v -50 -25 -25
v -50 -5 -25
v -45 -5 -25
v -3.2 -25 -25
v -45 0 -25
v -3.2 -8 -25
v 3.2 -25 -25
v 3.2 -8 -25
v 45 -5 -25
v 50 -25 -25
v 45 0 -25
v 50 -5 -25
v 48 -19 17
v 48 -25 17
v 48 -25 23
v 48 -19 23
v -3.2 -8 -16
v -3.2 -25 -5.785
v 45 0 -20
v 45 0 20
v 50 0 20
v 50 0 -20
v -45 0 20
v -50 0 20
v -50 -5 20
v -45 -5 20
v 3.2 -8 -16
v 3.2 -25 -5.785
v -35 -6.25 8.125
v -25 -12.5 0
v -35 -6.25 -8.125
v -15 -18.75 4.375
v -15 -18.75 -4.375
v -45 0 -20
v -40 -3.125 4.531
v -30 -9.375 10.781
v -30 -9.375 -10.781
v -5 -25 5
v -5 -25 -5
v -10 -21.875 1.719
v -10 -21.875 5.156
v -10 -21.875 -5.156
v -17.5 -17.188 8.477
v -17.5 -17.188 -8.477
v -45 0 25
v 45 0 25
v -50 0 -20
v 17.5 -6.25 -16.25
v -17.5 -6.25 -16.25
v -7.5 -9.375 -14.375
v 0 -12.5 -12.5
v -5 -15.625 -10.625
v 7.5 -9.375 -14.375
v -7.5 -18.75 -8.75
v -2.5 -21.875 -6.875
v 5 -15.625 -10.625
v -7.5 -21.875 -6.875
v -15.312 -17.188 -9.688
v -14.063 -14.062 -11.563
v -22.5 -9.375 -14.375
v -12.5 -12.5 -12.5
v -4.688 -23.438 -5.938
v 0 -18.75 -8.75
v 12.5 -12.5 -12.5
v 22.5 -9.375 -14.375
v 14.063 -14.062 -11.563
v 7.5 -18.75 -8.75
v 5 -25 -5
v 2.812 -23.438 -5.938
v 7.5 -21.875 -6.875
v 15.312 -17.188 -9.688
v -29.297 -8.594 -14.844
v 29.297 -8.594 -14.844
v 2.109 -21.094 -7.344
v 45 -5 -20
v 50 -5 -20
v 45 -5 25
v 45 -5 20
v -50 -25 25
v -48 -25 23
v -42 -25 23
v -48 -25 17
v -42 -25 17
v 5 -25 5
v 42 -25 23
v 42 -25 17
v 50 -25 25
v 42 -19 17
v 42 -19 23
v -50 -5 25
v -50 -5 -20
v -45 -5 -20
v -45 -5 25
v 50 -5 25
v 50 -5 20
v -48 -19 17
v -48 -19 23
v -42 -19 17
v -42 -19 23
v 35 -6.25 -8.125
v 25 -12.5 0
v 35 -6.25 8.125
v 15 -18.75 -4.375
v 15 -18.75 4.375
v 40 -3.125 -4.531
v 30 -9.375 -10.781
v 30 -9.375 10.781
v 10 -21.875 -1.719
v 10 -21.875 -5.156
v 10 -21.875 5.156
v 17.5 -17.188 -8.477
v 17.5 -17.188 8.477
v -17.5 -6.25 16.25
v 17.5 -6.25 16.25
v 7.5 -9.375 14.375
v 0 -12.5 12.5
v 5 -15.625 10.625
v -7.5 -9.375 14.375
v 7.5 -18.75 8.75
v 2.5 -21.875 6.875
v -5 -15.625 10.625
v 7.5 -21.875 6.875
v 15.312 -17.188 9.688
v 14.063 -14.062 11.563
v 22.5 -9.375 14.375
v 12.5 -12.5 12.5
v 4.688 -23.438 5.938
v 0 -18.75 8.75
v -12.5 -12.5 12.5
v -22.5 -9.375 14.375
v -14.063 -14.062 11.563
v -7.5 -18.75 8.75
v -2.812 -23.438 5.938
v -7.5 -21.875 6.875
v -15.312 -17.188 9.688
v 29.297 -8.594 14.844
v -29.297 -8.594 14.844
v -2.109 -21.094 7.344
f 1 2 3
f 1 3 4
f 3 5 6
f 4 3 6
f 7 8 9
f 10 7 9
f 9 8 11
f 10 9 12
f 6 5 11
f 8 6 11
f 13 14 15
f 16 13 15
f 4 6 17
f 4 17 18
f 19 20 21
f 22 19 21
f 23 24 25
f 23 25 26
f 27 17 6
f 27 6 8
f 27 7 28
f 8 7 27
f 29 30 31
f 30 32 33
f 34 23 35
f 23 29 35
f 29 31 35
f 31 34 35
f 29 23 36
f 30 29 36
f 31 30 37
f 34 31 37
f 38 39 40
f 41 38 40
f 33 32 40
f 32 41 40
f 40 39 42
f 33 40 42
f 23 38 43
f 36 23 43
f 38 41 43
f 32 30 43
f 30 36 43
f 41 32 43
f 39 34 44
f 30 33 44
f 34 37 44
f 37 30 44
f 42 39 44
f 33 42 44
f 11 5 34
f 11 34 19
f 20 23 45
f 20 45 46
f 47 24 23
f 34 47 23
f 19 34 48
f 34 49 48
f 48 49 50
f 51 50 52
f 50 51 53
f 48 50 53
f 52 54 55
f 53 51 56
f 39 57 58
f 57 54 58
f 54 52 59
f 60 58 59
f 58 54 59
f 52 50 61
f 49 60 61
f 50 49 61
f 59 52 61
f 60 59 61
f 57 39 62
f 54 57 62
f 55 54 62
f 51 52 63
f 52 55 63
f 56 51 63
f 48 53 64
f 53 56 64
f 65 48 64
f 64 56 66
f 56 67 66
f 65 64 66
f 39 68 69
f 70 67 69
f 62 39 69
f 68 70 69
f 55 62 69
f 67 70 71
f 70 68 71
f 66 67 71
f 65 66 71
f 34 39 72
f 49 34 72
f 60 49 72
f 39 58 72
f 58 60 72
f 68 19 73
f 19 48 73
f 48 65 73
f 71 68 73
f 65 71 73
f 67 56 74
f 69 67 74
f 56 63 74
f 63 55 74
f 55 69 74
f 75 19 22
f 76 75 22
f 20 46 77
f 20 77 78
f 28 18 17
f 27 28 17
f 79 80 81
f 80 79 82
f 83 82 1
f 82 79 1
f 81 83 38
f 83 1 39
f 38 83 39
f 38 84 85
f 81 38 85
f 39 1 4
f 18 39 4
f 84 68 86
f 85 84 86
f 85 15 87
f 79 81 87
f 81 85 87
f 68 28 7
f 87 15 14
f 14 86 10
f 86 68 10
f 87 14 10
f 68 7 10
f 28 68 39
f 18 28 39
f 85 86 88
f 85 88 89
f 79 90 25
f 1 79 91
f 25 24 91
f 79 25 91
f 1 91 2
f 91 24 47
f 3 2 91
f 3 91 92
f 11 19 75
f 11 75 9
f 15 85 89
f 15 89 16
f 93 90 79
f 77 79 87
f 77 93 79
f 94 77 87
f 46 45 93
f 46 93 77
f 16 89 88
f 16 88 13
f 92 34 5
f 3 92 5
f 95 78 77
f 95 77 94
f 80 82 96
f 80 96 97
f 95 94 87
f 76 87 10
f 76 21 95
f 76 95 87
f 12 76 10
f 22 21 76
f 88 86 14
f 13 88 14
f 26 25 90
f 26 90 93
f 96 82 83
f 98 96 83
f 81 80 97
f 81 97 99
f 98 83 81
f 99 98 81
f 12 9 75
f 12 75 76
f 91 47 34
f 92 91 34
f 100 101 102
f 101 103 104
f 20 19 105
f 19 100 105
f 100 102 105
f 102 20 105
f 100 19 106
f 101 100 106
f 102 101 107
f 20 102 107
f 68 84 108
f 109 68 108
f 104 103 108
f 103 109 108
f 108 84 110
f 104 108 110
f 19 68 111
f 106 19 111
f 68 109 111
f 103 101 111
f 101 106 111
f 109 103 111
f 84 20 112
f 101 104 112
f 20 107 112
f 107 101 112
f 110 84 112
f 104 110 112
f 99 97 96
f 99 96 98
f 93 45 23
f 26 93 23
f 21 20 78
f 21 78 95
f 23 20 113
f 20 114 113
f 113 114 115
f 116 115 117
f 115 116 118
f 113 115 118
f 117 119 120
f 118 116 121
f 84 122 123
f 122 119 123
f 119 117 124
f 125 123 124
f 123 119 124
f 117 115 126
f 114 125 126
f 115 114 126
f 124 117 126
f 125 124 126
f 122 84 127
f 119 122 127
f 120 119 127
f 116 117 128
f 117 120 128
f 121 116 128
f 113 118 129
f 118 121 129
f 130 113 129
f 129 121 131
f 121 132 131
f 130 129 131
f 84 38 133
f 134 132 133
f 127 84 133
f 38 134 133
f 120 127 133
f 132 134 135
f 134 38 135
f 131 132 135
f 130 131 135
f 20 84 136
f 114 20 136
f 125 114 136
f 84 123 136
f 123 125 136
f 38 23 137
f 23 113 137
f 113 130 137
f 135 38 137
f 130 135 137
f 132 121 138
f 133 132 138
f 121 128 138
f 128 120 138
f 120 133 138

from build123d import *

# Parameters (mm, degrees)
SKETCH2_W           = 100
SKETCH2_H           = 50
BOSS_EXTRUDE1_DEPTH = 25
CUT_EXTRUDE1_DEPTH  = 9
CUT_EXTRUDE2_DEPTH  = 6.4
SKETCH8_W           = 6
SKETCH8_H           = 6
CUT_EXTRUDE3_DEPTH  = 6
SKETCH9_W           = 5
SKETCH9_H           = 5
CUT_EXTRUDE4_DEPTH  = 5


with BuildPart() as part:
    # Sketch2 → Boss-Extrude1 (new body)
    with BuildSketch(Plane(origin=(0, 0, 0), x_dir=(1, 0, 0), z_dir=(0, 1, 0))):
        Rectangle(SKETCH2_W, SKETCH2_H)
    extrude(amount=-BOSS_EXTRUDE1_DEPTH)

    # Sketch3 → Cut-Loft4 section 0
    with BuildSketch(Plane(origin=(0, 0, 0), x_dir=(1, 0, 0), z_dir=(0, 1, 0))):
        with BuildLine():
            Line((-45, 20), (45, 20))
            Line((45, 20), (45, -20))
            Line((45, -20), (-45, -20))
            Line((-45, -20), (-45, 20))
        make_face()
    # Sketch4 → Cut-Loft4 section 1
    with BuildSketch(Plane.XZ.offset(25)):
        with BuildLine():
            Line((-5, 5), (5, 5))
            Line((5, 5), (5, -5))
            Line((5, -5), (-5, -5))
            Line((-5, -5), (-5, 5))
        make_face()
    loft(mode=Mode.SUBTRACT)

    # Sketch5 → Cut-Extrude1 (cut)
    with BuildSketch(Plane(origin=(0, 0, -25), x_dir=(-1, 0, 0), z_dir=(0, 0, -1))):
        Polygon((0, -8), (3.2, -8), (3.2, -25), (-3.2, -25), (-3.2, -8), align=None)
    extrude(amount=-CUT_EXTRUDE1_DEPTH, mode=Mode.SUBTRACT)

    # Sketch6 → Cut-Extrude2 (cut)
    with BuildSketch(Plane(origin=(-3.2, 0, 0), x_dir=(0, 0, -1), z_dir=(1, 0, 0))):
        Polygon((16, -25), (5.785369477, -25), (16, -8), align=None)
    extrude(amount=CUT_EXTRUDE2_DEPTH, mode=Mode.SUBTRACT)

    # Sketch8 → Cut-Extrude3 (cut)
    with BuildSketch(Plane.XZ.offset(25)):
        with Locations((-45, 20)):
            Rectangle(SKETCH8_W, SKETCH8_H)
        with Locations((45, 20)):
            Rectangle(SKETCH8_W, SKETCH8_H)
    extrude(amount=-CUT_EXTRUDE3_DEPTH, mode=Mode.SUBTRACT)

    # Sketch9 → Cut-Extrude4 (cut)
    with BuildSketch(Plane(origin=(0, 0, 0), x_dir=(1, 0, 0), z_dir=(0, 1, 0))):
        with Locations((47.5, -22.5)):
            Rectangle(SKETCH9_W, SKETCH9_H)
        with Locations((-47.5, -22.5)):
            Rectangle(SKETCH9_W, SKETCH9_H)
        with Locations((-47.5, 22.5)):
            Rectangle(SKETCH9_W, SKETCH9_H)
        with Locations((47.5, 22.5)):
            Rectangle(SKETCH9_W, SKETCH9_H)
    extrude(amount=-CUT_EXTRUDE4_DEPTH, mode=Mode.SUBTRACT)


solid = part.part
